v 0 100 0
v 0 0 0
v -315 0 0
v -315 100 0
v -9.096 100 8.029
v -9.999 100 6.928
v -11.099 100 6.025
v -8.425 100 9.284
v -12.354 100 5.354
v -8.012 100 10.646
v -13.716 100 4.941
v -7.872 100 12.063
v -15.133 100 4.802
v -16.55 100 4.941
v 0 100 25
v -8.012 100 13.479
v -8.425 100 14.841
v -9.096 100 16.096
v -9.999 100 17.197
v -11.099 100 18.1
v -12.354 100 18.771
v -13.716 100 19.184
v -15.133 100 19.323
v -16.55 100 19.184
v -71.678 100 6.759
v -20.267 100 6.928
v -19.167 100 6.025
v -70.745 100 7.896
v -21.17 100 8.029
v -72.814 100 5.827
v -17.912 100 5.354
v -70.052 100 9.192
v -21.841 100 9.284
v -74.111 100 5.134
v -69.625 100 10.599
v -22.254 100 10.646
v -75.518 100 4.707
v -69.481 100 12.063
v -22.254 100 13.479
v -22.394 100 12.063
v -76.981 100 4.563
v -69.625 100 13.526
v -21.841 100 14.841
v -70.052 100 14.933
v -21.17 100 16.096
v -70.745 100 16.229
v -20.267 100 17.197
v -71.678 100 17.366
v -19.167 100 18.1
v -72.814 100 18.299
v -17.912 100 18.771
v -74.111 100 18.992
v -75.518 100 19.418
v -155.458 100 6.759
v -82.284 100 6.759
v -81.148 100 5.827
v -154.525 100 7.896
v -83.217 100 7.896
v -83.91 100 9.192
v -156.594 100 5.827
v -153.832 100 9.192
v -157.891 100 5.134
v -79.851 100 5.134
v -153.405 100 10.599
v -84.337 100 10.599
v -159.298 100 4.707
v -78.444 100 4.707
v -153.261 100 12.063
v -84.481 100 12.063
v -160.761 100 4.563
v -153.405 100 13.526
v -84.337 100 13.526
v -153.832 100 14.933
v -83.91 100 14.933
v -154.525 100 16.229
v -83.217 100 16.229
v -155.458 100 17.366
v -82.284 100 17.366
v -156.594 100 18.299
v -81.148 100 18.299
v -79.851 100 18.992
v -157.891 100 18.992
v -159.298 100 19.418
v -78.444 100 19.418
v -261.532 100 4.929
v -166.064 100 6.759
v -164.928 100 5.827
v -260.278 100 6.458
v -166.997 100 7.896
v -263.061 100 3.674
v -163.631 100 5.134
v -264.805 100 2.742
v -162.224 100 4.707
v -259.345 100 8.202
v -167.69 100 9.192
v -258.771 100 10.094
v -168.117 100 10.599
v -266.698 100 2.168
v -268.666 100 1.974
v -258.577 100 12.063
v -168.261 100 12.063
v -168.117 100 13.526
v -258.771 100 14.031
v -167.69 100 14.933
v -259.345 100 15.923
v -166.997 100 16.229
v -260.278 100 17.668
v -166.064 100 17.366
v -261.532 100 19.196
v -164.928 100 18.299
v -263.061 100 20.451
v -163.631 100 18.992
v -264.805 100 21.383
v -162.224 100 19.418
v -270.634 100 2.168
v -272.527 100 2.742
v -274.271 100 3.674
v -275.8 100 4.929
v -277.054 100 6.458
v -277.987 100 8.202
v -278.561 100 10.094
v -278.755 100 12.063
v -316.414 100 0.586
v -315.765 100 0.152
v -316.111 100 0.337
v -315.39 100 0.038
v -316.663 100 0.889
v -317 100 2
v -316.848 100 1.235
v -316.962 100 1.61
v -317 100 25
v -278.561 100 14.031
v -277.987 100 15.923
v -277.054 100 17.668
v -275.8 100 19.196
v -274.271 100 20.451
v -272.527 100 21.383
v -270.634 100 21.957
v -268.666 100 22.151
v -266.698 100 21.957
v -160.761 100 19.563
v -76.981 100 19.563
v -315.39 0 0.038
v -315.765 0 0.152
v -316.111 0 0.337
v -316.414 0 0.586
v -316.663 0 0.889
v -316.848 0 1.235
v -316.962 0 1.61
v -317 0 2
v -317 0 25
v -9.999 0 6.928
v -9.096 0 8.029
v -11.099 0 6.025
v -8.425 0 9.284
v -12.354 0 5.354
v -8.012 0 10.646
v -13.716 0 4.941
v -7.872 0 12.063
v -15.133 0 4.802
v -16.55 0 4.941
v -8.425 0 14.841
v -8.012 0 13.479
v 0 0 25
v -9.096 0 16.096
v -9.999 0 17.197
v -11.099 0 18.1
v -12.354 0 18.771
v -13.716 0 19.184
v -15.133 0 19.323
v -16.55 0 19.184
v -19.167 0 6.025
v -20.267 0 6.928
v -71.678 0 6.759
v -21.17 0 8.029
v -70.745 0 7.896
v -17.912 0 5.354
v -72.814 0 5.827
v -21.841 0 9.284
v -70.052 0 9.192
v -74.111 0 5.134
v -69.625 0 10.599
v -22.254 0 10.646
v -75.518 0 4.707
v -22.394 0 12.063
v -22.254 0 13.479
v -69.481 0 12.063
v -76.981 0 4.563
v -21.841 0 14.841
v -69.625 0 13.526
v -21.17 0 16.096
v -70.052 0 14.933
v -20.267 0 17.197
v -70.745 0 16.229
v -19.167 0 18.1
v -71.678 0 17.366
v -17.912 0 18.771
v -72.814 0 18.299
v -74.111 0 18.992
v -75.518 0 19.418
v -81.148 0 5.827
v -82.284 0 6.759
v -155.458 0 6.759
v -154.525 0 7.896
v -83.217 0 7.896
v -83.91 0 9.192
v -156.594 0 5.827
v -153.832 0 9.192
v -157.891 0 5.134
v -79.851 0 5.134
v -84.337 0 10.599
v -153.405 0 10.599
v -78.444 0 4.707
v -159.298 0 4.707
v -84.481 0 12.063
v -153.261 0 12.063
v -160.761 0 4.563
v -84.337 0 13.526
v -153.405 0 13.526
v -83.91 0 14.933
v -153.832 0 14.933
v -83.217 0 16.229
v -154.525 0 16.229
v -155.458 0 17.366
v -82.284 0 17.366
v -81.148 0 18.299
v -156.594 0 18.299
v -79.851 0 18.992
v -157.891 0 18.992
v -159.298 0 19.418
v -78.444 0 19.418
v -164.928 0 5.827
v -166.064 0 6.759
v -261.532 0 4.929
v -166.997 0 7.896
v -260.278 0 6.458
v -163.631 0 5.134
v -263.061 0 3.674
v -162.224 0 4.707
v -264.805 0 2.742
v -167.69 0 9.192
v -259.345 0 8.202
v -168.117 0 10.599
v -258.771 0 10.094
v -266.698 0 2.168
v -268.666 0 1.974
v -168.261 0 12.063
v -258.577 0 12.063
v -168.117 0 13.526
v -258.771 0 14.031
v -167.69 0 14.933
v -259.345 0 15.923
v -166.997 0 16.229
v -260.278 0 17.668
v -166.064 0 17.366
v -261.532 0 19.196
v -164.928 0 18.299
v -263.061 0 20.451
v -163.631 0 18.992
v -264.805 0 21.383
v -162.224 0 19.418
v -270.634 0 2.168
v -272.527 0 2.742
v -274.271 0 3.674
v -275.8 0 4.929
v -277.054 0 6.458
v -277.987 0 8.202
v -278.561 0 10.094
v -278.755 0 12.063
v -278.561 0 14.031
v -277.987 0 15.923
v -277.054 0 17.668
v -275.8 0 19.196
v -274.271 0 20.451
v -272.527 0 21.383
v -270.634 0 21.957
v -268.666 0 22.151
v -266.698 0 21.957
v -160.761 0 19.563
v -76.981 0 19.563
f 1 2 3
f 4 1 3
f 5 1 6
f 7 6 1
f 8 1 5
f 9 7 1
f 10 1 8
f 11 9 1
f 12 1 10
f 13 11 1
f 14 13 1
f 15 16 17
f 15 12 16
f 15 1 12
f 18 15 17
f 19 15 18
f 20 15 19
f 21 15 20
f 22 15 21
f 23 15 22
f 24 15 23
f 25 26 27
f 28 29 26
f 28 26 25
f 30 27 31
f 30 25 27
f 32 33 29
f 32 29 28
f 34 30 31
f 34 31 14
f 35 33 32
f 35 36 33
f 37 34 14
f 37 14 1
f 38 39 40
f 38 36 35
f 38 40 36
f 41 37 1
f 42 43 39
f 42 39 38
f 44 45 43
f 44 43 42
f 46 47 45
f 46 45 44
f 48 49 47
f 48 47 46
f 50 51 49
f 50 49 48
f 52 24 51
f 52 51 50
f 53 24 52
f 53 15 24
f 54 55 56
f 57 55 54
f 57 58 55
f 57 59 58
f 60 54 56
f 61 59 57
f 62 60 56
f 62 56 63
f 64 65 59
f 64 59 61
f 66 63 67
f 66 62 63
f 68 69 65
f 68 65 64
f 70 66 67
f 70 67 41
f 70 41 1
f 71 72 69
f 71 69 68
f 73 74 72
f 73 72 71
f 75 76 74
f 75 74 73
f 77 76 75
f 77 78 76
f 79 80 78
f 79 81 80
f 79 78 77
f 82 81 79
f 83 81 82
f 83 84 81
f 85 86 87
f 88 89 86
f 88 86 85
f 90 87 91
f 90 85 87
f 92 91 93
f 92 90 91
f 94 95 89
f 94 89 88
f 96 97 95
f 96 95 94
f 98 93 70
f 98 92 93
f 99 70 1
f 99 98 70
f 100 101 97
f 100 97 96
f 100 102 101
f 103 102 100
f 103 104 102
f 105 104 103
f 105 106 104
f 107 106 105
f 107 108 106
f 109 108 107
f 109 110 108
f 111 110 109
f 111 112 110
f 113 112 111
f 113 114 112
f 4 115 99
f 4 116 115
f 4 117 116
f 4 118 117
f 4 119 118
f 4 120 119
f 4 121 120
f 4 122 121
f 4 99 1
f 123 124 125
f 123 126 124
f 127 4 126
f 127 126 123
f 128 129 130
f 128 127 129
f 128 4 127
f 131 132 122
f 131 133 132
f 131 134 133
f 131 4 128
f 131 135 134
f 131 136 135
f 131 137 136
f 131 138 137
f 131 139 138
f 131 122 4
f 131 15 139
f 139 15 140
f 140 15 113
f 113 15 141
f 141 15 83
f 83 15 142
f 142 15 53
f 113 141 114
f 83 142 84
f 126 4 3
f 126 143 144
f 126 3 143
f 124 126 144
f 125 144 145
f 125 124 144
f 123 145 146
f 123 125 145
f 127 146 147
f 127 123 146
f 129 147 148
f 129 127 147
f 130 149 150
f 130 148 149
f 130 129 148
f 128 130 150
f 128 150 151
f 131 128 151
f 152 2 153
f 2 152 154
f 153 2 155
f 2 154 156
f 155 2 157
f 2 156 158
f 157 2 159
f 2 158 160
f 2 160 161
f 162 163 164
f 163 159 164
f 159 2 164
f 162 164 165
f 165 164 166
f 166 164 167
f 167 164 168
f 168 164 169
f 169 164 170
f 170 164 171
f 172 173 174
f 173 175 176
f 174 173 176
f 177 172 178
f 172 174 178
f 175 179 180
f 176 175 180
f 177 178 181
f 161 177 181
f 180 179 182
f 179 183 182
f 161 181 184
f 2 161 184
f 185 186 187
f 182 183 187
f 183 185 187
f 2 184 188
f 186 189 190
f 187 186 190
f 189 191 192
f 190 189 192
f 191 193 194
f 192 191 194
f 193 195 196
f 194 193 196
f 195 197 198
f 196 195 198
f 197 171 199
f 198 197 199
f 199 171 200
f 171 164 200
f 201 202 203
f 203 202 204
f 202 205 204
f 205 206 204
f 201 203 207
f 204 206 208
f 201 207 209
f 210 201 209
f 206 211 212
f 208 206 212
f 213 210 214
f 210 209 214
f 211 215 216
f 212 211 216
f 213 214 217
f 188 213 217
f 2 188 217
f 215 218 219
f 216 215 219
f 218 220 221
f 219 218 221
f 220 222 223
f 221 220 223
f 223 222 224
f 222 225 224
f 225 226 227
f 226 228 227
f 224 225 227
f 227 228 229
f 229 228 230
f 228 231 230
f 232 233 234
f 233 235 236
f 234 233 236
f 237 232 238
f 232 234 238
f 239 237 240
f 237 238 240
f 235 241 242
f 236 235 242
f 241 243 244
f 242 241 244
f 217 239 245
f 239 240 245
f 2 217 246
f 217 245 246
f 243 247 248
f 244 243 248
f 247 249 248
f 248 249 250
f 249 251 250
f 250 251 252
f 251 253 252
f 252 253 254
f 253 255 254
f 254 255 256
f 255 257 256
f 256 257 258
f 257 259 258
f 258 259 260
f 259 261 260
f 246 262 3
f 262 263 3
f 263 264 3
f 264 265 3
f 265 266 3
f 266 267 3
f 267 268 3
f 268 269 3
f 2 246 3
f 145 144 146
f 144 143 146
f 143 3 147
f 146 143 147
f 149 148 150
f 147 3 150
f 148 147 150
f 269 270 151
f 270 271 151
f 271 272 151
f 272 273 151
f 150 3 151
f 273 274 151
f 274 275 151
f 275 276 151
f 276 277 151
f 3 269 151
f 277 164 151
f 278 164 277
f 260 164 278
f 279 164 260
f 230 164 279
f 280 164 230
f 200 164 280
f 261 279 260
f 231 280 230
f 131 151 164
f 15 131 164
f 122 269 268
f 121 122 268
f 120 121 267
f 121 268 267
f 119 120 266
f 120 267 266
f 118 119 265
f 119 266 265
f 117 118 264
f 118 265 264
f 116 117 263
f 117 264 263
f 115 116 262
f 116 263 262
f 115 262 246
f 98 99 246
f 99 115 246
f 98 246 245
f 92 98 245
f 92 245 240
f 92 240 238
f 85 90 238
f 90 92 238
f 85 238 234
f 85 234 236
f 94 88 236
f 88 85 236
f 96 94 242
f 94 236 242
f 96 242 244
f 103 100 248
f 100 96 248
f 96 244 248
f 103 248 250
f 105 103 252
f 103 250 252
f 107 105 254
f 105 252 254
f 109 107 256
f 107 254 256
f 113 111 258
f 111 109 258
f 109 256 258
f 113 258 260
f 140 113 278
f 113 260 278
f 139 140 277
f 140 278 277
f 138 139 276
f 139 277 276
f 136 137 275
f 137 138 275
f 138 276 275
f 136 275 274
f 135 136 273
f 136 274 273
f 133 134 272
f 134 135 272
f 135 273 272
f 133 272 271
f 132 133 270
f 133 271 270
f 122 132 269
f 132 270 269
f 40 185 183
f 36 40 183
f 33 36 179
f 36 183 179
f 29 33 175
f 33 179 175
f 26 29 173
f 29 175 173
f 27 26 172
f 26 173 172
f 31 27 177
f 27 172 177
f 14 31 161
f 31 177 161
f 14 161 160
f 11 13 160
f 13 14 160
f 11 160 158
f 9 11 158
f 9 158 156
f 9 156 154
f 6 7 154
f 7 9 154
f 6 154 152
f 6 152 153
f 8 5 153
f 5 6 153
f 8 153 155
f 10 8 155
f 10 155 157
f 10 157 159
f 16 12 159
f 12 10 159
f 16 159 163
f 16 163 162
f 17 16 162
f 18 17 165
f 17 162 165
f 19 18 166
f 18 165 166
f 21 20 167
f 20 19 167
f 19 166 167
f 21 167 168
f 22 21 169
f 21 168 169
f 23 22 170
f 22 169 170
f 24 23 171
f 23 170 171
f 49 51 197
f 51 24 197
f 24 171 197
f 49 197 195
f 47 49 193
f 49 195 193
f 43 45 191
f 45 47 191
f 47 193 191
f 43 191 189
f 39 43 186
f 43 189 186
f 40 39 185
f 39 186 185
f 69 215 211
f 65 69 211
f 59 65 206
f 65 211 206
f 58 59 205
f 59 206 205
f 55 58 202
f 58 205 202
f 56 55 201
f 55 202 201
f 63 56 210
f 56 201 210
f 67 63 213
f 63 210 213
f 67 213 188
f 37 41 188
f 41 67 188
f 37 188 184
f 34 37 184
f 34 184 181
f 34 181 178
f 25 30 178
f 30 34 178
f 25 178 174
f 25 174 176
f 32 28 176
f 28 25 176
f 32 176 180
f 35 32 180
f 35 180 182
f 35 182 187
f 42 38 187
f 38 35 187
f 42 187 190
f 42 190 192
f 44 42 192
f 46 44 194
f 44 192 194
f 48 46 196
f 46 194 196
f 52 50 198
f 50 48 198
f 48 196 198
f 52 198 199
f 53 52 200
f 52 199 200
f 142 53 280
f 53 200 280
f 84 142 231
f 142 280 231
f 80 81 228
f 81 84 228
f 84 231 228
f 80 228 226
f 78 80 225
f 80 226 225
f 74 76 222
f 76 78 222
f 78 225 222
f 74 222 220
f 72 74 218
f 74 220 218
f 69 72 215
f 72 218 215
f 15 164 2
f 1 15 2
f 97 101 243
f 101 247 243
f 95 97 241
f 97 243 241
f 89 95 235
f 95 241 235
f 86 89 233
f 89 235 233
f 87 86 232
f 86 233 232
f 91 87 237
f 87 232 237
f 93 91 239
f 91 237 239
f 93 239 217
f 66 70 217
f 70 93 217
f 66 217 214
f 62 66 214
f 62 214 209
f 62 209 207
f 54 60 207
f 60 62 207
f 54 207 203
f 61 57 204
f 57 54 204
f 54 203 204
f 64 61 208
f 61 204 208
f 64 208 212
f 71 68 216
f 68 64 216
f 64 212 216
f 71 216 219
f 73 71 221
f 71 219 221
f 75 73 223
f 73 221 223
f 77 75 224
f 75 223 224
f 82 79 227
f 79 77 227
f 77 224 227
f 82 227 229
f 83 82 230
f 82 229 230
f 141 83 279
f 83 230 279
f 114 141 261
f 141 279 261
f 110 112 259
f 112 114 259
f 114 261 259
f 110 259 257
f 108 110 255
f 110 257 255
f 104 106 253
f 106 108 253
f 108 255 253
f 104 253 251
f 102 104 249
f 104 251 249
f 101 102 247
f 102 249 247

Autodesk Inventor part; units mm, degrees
ref_plane "YZ Plane" through (0, 0, 0) normal (1, 0, 0) x (0, 1, 0)
ref_plane "XZ Plane" through (0, 0, 0) normal (0, 1, 0) x (-1, 0, 0)
ref_plane "XY Plane" through (0, 0, 0) normal (0, 0, 1) x (1, 0, 0)
sketch "Sketch1" plane through (0, 0, 0) normal (0, 1, 0) x (-1, 0, 0)
  line L0 (0, 0) -> (317, 0)
  line L1 (317, 0) -> (317, 25)
  line L2 (317, 25) -> (0, 25)
  line L3 (0, 25) -> (0, 0)
  dimension "d0" = 317
  dimension "d1" = 25
extrude "Extrusion1" add sketch "Sketch1" along normal blind 100
fillet "Face Fillet1" radius 2 1 edges at (-317, 50, 0)
sketch "Sketch5" plane through (0, 0, 0) normal (0, 1, 0) x (-1, 0, 0)
  circle A0 centre (15.133, 12.0626) radius 7.2608
  circle A1 centre (76.981, 12.0626) radius 7.5
  circle A2 centre (160.761, 12.0626) radius 7.5
  circle A3 centre (268.666, 12.0626) radius 10.0887
  point P0 (0, 0)
  dimension "d16" = 15
  dimension "d17" = 15
extrude "Extrusion4" cut sketch "Sketch5" along normal blind 100
sketch "Sketch6" plane through (-317, 0, 25) normal (-1, 0, 0) x (0, 0, 1)
  point P0 (-25, 0)
properties part number "BASE"
